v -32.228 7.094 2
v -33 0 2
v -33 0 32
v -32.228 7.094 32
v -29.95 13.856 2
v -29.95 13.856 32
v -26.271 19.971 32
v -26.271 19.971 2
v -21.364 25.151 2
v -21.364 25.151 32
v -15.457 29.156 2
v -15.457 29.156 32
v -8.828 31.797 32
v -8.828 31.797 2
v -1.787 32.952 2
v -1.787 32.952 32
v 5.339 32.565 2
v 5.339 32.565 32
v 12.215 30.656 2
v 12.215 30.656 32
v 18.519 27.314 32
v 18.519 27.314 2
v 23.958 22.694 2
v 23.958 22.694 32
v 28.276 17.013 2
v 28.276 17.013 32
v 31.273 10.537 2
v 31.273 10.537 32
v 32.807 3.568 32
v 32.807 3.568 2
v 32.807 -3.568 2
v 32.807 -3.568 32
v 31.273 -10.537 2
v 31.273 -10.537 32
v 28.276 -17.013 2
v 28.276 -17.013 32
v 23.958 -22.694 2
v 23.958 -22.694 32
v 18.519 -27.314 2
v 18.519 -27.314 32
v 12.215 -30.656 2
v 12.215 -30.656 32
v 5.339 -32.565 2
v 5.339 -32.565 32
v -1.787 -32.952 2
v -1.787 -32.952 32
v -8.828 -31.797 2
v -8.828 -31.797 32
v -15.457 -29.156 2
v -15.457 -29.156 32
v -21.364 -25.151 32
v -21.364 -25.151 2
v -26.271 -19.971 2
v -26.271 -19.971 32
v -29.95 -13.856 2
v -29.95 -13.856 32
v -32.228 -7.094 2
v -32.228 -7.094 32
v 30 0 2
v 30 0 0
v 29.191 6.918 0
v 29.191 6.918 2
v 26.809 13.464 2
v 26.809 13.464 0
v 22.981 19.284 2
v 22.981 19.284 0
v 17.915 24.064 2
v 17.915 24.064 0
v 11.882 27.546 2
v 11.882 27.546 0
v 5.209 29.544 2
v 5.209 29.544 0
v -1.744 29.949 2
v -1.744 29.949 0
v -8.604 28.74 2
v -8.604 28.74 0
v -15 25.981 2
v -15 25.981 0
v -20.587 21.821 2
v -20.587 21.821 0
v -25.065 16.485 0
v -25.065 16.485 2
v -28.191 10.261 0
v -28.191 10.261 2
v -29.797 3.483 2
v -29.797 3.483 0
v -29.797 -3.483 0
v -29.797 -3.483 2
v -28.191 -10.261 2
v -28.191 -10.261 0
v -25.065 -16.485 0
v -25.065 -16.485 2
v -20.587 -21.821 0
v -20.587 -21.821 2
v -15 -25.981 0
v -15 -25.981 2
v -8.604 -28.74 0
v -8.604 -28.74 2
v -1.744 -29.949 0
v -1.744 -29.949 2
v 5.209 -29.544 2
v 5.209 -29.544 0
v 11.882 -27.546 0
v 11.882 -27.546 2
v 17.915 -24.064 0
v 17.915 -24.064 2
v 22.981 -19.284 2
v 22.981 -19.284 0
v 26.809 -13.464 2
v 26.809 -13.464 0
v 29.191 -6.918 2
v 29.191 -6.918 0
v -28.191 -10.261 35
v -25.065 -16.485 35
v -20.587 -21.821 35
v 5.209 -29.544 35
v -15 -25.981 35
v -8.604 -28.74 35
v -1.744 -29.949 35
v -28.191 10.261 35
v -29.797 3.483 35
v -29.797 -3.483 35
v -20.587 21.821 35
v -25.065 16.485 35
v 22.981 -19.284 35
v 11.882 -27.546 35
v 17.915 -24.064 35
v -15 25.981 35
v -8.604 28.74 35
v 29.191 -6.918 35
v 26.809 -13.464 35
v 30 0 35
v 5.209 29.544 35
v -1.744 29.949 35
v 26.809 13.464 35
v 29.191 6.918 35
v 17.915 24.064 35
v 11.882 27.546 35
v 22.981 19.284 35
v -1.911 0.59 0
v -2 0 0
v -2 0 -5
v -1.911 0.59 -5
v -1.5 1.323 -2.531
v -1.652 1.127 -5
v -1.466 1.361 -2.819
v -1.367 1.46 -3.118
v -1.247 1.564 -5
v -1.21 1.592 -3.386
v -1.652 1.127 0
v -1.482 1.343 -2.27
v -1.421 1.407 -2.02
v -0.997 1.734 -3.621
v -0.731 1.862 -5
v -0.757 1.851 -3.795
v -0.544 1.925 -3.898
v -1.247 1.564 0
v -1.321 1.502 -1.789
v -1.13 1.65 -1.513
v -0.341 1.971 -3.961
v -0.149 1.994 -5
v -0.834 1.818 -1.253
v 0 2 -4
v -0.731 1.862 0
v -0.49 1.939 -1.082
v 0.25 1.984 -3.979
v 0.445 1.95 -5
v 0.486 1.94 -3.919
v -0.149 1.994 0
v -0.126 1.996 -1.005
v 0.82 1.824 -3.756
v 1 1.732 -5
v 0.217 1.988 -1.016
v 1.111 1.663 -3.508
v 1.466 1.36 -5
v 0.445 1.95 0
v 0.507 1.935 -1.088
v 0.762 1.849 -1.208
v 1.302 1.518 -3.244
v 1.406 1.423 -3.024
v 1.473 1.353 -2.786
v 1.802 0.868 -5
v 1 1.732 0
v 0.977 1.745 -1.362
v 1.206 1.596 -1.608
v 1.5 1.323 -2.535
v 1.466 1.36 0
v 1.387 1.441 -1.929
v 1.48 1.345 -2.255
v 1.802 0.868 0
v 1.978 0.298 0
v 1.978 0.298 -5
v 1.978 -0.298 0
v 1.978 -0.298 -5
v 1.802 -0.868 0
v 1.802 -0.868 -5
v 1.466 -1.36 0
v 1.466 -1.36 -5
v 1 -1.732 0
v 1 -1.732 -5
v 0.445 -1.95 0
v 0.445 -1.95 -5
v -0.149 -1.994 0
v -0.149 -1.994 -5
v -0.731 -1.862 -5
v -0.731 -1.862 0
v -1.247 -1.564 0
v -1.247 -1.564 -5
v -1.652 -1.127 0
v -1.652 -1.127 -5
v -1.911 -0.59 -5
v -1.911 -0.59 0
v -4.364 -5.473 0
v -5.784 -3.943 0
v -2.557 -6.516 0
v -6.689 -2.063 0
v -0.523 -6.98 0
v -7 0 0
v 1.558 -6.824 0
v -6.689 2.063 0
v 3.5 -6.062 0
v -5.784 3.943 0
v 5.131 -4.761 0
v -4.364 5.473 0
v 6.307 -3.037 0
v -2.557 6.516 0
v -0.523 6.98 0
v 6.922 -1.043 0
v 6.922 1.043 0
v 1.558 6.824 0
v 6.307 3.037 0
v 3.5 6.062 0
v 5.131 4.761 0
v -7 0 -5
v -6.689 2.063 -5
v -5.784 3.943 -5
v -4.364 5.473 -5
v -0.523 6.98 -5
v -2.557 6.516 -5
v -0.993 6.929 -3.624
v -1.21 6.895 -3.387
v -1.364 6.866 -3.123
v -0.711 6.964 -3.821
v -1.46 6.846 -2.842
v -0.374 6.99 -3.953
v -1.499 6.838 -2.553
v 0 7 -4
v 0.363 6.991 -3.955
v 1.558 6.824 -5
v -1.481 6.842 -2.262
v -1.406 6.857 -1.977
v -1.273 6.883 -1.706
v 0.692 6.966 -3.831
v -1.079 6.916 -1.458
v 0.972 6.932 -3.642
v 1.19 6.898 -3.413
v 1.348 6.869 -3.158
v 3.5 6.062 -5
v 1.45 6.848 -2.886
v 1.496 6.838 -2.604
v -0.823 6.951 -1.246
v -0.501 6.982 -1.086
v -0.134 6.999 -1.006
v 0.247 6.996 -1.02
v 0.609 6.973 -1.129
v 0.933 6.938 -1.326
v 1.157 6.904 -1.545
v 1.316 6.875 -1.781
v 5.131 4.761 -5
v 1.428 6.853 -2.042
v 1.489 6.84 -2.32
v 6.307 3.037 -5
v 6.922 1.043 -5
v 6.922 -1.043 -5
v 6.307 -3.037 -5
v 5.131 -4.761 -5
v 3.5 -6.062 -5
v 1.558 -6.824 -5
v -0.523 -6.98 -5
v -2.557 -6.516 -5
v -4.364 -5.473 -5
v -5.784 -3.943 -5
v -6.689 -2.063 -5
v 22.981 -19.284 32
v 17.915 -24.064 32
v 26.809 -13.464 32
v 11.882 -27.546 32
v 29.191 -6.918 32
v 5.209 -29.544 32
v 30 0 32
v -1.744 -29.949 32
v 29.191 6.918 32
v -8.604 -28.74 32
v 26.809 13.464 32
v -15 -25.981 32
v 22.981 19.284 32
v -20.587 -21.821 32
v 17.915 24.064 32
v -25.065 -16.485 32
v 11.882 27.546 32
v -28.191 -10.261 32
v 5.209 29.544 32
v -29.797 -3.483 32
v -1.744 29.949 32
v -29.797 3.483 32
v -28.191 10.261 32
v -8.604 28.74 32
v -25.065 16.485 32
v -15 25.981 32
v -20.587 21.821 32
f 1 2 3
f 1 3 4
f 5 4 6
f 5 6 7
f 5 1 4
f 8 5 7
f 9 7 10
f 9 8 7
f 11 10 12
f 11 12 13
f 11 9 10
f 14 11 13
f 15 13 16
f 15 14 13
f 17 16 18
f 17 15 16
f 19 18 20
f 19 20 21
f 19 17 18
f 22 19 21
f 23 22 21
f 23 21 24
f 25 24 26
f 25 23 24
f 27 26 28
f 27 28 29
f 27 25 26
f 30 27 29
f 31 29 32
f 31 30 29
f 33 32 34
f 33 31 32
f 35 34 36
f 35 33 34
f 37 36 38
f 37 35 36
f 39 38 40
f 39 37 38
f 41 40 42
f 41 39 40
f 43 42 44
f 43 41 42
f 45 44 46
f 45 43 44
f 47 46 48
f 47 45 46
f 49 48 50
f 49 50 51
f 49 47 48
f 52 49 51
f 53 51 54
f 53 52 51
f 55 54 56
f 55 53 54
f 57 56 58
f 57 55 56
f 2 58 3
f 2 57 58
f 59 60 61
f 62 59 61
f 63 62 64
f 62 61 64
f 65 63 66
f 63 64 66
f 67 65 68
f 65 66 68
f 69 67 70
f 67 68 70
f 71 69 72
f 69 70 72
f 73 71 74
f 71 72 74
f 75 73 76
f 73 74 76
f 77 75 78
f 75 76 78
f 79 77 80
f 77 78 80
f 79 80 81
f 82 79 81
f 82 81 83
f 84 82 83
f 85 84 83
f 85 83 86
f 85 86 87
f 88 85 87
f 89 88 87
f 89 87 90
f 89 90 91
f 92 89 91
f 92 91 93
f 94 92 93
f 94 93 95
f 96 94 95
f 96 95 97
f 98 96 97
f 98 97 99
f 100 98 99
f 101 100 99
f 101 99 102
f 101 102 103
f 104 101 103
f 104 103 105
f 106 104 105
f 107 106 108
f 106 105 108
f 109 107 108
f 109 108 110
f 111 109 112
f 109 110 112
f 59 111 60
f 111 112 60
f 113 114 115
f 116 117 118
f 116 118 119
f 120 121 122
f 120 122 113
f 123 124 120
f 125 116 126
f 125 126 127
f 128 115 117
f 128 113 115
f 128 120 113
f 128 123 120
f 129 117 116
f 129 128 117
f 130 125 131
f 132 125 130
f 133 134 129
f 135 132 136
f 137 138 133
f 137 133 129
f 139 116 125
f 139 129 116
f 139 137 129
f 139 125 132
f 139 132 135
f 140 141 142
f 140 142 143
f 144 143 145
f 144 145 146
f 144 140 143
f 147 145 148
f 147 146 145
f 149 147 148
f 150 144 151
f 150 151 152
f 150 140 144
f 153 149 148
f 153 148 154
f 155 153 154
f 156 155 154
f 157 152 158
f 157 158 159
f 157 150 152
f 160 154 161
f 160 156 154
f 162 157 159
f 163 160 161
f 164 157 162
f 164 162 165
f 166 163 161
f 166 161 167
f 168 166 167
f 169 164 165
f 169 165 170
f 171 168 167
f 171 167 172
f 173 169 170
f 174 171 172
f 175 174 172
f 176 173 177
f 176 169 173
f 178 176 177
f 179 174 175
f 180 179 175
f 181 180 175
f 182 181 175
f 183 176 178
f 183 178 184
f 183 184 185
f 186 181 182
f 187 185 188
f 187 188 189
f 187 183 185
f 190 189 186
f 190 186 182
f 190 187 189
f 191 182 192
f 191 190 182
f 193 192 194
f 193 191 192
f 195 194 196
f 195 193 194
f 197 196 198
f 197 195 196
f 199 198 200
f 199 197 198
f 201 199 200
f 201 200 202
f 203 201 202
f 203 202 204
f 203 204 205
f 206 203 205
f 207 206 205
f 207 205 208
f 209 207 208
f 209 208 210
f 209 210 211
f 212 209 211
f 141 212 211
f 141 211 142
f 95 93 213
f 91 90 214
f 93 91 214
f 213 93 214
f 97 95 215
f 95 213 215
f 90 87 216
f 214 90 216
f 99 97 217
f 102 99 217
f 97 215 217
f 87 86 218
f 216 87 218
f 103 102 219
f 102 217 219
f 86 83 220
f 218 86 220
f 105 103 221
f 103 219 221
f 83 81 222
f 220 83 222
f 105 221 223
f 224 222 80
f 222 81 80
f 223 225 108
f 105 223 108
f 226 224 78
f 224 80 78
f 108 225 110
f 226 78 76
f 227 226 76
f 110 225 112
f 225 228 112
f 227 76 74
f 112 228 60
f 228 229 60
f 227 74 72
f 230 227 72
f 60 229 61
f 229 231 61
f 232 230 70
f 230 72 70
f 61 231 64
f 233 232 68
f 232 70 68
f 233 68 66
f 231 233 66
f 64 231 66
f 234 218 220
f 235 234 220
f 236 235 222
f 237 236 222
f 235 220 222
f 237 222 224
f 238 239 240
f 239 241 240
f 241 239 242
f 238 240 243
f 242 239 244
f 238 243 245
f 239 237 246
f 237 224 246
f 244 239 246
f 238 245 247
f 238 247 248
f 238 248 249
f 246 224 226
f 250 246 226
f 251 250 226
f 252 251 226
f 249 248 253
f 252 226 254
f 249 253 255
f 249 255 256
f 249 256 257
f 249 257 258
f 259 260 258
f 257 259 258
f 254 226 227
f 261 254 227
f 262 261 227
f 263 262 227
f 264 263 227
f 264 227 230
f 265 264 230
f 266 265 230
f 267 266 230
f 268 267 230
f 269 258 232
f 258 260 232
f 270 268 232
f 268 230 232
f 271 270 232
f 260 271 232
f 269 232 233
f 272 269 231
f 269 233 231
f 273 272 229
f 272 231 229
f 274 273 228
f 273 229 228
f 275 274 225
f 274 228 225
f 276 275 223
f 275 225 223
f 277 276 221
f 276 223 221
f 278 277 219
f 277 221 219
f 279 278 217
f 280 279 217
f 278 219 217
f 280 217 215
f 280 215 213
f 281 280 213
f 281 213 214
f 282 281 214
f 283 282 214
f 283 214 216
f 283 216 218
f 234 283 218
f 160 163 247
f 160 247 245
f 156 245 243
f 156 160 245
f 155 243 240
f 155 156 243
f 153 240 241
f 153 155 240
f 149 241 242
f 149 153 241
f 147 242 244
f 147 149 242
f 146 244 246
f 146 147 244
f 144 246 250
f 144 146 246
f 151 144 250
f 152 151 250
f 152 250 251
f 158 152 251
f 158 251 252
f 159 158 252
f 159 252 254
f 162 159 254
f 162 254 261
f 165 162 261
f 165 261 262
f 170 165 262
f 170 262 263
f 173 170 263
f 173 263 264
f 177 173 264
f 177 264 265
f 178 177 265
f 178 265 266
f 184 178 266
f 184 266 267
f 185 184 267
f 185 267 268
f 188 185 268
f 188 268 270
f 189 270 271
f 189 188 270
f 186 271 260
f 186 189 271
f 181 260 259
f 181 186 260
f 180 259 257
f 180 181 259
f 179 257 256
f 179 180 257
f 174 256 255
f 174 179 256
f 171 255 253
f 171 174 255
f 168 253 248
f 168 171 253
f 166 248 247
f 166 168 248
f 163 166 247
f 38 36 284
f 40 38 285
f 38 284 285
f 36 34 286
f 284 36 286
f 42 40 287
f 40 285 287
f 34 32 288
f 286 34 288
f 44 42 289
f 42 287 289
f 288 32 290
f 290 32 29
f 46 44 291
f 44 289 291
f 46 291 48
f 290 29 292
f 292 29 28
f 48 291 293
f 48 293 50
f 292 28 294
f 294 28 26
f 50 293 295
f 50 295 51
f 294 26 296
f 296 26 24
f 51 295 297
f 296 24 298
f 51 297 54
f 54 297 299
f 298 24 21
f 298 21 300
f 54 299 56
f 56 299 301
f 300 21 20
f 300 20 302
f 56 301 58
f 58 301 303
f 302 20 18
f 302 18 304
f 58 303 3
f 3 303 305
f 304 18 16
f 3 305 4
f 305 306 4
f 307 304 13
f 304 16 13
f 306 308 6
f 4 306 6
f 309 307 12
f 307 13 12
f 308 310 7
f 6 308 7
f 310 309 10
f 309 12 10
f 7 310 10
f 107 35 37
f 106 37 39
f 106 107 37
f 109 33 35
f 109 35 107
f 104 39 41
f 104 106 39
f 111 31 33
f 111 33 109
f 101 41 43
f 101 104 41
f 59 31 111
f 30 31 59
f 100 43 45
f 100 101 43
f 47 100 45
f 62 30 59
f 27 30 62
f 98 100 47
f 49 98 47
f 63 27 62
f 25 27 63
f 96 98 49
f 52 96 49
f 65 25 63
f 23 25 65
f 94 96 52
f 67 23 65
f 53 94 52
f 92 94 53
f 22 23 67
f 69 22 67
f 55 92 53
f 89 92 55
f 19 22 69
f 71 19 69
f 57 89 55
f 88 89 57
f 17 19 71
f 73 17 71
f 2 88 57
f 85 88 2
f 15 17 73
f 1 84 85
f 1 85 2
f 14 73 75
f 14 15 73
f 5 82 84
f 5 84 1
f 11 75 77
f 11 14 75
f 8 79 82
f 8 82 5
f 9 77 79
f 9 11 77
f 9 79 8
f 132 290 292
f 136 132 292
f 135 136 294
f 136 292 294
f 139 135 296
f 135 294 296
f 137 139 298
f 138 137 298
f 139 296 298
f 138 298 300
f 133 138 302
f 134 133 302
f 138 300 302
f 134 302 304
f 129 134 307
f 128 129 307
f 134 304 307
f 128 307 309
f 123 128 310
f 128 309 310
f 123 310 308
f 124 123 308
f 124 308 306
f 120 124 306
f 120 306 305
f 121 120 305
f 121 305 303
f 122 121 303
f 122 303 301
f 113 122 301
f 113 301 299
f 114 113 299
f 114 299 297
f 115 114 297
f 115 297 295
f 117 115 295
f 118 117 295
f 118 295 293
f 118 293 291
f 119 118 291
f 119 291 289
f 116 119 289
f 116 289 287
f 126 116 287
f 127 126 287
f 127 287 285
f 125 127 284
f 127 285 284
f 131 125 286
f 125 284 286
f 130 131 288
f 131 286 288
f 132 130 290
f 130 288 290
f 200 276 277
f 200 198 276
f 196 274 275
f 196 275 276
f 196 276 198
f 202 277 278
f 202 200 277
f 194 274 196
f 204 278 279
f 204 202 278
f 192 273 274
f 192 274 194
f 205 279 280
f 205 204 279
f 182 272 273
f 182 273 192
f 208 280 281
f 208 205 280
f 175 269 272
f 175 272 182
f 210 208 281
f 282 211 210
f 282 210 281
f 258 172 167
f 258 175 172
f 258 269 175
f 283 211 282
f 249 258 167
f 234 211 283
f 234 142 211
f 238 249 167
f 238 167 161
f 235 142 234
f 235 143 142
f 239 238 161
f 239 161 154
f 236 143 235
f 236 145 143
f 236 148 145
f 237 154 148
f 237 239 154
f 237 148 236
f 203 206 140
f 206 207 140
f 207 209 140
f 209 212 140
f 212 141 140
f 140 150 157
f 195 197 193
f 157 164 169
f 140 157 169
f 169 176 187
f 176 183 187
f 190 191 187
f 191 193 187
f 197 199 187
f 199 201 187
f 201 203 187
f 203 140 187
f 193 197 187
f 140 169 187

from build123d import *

# Parameters (mm, degrees)
ESQUISSE1_R             = 30
BOSS_EXTRU_1_DEPTH      = 35
BOSS_EXTRU_2_START      = -2
ESQUISSE3_R             = 33
ESQUISSE3_R_2           = 30
BOSS_EXTRU_2_DEPTH      = 30
ESQUISSE4_R             = 7
ESQUISSE4_R_2           = 2
BOSS_EXTRU_3_DEPTH      = 5
ESQUISSE5_R             = 1.5
ENL_V_MAT_EXTRU_1_DEPTH = 59.335238064


with BuildPart() as part:
    # Esquisse1 → Boss.-Extru.1 (new body)
    with BuildSketch(Plane.XY):
        Circle(ESQUISSE1_R)
    extrude(amount=BOSS_EXTRU_1_DEPTH)

    # Esquisse3 → Boss.-Extru.2 (add)
    with BuildSketch(Plane(origin=(0, 0, 0), x_dir=(-1, 0, 0), z_dir=(0, 0, -1)).offset(BOSS_EXTRU_2_START)):
        Circle(ESQUISSE3_R)
        Circle(ESQUISSE3_R_2, mode=Mode.SUBTRACT)
    extrude(amount=-BOSS_EXTRU_2_DEPTH)

    # Esquisse4 → Boss.-Extru.3 (add)
    with BuildSketch(Plane(origin=(0, 0, 0), x_dir=(-1, 0, 0), z_dir=(0, 0, -1))):
        Circle(ESQUISSE4_R)
        Circle(ESQUISSE4_R_2, mode=Mode.SUBTRACT)
    extrude(amount=BOSS_EXTRU_3_DEPTH)

    # Esquisse5 → Enlèv. mat.-Extru.1 (cut, through all)
    with BuildSketch(Plane(origin=(0, 0, 0), x_dir=(1, 0, 0), z_dir=(0, 1, 0))):
        with Locations(Location((0, 2.5, 0), (0, 0, 90))):
            Circle(ESQUISSE5_R)
    extrude(amount=ENL_V_MAT_EXTRU_1_DEPTH, mode=Mode.SUBTRACT)


solid = part.part
